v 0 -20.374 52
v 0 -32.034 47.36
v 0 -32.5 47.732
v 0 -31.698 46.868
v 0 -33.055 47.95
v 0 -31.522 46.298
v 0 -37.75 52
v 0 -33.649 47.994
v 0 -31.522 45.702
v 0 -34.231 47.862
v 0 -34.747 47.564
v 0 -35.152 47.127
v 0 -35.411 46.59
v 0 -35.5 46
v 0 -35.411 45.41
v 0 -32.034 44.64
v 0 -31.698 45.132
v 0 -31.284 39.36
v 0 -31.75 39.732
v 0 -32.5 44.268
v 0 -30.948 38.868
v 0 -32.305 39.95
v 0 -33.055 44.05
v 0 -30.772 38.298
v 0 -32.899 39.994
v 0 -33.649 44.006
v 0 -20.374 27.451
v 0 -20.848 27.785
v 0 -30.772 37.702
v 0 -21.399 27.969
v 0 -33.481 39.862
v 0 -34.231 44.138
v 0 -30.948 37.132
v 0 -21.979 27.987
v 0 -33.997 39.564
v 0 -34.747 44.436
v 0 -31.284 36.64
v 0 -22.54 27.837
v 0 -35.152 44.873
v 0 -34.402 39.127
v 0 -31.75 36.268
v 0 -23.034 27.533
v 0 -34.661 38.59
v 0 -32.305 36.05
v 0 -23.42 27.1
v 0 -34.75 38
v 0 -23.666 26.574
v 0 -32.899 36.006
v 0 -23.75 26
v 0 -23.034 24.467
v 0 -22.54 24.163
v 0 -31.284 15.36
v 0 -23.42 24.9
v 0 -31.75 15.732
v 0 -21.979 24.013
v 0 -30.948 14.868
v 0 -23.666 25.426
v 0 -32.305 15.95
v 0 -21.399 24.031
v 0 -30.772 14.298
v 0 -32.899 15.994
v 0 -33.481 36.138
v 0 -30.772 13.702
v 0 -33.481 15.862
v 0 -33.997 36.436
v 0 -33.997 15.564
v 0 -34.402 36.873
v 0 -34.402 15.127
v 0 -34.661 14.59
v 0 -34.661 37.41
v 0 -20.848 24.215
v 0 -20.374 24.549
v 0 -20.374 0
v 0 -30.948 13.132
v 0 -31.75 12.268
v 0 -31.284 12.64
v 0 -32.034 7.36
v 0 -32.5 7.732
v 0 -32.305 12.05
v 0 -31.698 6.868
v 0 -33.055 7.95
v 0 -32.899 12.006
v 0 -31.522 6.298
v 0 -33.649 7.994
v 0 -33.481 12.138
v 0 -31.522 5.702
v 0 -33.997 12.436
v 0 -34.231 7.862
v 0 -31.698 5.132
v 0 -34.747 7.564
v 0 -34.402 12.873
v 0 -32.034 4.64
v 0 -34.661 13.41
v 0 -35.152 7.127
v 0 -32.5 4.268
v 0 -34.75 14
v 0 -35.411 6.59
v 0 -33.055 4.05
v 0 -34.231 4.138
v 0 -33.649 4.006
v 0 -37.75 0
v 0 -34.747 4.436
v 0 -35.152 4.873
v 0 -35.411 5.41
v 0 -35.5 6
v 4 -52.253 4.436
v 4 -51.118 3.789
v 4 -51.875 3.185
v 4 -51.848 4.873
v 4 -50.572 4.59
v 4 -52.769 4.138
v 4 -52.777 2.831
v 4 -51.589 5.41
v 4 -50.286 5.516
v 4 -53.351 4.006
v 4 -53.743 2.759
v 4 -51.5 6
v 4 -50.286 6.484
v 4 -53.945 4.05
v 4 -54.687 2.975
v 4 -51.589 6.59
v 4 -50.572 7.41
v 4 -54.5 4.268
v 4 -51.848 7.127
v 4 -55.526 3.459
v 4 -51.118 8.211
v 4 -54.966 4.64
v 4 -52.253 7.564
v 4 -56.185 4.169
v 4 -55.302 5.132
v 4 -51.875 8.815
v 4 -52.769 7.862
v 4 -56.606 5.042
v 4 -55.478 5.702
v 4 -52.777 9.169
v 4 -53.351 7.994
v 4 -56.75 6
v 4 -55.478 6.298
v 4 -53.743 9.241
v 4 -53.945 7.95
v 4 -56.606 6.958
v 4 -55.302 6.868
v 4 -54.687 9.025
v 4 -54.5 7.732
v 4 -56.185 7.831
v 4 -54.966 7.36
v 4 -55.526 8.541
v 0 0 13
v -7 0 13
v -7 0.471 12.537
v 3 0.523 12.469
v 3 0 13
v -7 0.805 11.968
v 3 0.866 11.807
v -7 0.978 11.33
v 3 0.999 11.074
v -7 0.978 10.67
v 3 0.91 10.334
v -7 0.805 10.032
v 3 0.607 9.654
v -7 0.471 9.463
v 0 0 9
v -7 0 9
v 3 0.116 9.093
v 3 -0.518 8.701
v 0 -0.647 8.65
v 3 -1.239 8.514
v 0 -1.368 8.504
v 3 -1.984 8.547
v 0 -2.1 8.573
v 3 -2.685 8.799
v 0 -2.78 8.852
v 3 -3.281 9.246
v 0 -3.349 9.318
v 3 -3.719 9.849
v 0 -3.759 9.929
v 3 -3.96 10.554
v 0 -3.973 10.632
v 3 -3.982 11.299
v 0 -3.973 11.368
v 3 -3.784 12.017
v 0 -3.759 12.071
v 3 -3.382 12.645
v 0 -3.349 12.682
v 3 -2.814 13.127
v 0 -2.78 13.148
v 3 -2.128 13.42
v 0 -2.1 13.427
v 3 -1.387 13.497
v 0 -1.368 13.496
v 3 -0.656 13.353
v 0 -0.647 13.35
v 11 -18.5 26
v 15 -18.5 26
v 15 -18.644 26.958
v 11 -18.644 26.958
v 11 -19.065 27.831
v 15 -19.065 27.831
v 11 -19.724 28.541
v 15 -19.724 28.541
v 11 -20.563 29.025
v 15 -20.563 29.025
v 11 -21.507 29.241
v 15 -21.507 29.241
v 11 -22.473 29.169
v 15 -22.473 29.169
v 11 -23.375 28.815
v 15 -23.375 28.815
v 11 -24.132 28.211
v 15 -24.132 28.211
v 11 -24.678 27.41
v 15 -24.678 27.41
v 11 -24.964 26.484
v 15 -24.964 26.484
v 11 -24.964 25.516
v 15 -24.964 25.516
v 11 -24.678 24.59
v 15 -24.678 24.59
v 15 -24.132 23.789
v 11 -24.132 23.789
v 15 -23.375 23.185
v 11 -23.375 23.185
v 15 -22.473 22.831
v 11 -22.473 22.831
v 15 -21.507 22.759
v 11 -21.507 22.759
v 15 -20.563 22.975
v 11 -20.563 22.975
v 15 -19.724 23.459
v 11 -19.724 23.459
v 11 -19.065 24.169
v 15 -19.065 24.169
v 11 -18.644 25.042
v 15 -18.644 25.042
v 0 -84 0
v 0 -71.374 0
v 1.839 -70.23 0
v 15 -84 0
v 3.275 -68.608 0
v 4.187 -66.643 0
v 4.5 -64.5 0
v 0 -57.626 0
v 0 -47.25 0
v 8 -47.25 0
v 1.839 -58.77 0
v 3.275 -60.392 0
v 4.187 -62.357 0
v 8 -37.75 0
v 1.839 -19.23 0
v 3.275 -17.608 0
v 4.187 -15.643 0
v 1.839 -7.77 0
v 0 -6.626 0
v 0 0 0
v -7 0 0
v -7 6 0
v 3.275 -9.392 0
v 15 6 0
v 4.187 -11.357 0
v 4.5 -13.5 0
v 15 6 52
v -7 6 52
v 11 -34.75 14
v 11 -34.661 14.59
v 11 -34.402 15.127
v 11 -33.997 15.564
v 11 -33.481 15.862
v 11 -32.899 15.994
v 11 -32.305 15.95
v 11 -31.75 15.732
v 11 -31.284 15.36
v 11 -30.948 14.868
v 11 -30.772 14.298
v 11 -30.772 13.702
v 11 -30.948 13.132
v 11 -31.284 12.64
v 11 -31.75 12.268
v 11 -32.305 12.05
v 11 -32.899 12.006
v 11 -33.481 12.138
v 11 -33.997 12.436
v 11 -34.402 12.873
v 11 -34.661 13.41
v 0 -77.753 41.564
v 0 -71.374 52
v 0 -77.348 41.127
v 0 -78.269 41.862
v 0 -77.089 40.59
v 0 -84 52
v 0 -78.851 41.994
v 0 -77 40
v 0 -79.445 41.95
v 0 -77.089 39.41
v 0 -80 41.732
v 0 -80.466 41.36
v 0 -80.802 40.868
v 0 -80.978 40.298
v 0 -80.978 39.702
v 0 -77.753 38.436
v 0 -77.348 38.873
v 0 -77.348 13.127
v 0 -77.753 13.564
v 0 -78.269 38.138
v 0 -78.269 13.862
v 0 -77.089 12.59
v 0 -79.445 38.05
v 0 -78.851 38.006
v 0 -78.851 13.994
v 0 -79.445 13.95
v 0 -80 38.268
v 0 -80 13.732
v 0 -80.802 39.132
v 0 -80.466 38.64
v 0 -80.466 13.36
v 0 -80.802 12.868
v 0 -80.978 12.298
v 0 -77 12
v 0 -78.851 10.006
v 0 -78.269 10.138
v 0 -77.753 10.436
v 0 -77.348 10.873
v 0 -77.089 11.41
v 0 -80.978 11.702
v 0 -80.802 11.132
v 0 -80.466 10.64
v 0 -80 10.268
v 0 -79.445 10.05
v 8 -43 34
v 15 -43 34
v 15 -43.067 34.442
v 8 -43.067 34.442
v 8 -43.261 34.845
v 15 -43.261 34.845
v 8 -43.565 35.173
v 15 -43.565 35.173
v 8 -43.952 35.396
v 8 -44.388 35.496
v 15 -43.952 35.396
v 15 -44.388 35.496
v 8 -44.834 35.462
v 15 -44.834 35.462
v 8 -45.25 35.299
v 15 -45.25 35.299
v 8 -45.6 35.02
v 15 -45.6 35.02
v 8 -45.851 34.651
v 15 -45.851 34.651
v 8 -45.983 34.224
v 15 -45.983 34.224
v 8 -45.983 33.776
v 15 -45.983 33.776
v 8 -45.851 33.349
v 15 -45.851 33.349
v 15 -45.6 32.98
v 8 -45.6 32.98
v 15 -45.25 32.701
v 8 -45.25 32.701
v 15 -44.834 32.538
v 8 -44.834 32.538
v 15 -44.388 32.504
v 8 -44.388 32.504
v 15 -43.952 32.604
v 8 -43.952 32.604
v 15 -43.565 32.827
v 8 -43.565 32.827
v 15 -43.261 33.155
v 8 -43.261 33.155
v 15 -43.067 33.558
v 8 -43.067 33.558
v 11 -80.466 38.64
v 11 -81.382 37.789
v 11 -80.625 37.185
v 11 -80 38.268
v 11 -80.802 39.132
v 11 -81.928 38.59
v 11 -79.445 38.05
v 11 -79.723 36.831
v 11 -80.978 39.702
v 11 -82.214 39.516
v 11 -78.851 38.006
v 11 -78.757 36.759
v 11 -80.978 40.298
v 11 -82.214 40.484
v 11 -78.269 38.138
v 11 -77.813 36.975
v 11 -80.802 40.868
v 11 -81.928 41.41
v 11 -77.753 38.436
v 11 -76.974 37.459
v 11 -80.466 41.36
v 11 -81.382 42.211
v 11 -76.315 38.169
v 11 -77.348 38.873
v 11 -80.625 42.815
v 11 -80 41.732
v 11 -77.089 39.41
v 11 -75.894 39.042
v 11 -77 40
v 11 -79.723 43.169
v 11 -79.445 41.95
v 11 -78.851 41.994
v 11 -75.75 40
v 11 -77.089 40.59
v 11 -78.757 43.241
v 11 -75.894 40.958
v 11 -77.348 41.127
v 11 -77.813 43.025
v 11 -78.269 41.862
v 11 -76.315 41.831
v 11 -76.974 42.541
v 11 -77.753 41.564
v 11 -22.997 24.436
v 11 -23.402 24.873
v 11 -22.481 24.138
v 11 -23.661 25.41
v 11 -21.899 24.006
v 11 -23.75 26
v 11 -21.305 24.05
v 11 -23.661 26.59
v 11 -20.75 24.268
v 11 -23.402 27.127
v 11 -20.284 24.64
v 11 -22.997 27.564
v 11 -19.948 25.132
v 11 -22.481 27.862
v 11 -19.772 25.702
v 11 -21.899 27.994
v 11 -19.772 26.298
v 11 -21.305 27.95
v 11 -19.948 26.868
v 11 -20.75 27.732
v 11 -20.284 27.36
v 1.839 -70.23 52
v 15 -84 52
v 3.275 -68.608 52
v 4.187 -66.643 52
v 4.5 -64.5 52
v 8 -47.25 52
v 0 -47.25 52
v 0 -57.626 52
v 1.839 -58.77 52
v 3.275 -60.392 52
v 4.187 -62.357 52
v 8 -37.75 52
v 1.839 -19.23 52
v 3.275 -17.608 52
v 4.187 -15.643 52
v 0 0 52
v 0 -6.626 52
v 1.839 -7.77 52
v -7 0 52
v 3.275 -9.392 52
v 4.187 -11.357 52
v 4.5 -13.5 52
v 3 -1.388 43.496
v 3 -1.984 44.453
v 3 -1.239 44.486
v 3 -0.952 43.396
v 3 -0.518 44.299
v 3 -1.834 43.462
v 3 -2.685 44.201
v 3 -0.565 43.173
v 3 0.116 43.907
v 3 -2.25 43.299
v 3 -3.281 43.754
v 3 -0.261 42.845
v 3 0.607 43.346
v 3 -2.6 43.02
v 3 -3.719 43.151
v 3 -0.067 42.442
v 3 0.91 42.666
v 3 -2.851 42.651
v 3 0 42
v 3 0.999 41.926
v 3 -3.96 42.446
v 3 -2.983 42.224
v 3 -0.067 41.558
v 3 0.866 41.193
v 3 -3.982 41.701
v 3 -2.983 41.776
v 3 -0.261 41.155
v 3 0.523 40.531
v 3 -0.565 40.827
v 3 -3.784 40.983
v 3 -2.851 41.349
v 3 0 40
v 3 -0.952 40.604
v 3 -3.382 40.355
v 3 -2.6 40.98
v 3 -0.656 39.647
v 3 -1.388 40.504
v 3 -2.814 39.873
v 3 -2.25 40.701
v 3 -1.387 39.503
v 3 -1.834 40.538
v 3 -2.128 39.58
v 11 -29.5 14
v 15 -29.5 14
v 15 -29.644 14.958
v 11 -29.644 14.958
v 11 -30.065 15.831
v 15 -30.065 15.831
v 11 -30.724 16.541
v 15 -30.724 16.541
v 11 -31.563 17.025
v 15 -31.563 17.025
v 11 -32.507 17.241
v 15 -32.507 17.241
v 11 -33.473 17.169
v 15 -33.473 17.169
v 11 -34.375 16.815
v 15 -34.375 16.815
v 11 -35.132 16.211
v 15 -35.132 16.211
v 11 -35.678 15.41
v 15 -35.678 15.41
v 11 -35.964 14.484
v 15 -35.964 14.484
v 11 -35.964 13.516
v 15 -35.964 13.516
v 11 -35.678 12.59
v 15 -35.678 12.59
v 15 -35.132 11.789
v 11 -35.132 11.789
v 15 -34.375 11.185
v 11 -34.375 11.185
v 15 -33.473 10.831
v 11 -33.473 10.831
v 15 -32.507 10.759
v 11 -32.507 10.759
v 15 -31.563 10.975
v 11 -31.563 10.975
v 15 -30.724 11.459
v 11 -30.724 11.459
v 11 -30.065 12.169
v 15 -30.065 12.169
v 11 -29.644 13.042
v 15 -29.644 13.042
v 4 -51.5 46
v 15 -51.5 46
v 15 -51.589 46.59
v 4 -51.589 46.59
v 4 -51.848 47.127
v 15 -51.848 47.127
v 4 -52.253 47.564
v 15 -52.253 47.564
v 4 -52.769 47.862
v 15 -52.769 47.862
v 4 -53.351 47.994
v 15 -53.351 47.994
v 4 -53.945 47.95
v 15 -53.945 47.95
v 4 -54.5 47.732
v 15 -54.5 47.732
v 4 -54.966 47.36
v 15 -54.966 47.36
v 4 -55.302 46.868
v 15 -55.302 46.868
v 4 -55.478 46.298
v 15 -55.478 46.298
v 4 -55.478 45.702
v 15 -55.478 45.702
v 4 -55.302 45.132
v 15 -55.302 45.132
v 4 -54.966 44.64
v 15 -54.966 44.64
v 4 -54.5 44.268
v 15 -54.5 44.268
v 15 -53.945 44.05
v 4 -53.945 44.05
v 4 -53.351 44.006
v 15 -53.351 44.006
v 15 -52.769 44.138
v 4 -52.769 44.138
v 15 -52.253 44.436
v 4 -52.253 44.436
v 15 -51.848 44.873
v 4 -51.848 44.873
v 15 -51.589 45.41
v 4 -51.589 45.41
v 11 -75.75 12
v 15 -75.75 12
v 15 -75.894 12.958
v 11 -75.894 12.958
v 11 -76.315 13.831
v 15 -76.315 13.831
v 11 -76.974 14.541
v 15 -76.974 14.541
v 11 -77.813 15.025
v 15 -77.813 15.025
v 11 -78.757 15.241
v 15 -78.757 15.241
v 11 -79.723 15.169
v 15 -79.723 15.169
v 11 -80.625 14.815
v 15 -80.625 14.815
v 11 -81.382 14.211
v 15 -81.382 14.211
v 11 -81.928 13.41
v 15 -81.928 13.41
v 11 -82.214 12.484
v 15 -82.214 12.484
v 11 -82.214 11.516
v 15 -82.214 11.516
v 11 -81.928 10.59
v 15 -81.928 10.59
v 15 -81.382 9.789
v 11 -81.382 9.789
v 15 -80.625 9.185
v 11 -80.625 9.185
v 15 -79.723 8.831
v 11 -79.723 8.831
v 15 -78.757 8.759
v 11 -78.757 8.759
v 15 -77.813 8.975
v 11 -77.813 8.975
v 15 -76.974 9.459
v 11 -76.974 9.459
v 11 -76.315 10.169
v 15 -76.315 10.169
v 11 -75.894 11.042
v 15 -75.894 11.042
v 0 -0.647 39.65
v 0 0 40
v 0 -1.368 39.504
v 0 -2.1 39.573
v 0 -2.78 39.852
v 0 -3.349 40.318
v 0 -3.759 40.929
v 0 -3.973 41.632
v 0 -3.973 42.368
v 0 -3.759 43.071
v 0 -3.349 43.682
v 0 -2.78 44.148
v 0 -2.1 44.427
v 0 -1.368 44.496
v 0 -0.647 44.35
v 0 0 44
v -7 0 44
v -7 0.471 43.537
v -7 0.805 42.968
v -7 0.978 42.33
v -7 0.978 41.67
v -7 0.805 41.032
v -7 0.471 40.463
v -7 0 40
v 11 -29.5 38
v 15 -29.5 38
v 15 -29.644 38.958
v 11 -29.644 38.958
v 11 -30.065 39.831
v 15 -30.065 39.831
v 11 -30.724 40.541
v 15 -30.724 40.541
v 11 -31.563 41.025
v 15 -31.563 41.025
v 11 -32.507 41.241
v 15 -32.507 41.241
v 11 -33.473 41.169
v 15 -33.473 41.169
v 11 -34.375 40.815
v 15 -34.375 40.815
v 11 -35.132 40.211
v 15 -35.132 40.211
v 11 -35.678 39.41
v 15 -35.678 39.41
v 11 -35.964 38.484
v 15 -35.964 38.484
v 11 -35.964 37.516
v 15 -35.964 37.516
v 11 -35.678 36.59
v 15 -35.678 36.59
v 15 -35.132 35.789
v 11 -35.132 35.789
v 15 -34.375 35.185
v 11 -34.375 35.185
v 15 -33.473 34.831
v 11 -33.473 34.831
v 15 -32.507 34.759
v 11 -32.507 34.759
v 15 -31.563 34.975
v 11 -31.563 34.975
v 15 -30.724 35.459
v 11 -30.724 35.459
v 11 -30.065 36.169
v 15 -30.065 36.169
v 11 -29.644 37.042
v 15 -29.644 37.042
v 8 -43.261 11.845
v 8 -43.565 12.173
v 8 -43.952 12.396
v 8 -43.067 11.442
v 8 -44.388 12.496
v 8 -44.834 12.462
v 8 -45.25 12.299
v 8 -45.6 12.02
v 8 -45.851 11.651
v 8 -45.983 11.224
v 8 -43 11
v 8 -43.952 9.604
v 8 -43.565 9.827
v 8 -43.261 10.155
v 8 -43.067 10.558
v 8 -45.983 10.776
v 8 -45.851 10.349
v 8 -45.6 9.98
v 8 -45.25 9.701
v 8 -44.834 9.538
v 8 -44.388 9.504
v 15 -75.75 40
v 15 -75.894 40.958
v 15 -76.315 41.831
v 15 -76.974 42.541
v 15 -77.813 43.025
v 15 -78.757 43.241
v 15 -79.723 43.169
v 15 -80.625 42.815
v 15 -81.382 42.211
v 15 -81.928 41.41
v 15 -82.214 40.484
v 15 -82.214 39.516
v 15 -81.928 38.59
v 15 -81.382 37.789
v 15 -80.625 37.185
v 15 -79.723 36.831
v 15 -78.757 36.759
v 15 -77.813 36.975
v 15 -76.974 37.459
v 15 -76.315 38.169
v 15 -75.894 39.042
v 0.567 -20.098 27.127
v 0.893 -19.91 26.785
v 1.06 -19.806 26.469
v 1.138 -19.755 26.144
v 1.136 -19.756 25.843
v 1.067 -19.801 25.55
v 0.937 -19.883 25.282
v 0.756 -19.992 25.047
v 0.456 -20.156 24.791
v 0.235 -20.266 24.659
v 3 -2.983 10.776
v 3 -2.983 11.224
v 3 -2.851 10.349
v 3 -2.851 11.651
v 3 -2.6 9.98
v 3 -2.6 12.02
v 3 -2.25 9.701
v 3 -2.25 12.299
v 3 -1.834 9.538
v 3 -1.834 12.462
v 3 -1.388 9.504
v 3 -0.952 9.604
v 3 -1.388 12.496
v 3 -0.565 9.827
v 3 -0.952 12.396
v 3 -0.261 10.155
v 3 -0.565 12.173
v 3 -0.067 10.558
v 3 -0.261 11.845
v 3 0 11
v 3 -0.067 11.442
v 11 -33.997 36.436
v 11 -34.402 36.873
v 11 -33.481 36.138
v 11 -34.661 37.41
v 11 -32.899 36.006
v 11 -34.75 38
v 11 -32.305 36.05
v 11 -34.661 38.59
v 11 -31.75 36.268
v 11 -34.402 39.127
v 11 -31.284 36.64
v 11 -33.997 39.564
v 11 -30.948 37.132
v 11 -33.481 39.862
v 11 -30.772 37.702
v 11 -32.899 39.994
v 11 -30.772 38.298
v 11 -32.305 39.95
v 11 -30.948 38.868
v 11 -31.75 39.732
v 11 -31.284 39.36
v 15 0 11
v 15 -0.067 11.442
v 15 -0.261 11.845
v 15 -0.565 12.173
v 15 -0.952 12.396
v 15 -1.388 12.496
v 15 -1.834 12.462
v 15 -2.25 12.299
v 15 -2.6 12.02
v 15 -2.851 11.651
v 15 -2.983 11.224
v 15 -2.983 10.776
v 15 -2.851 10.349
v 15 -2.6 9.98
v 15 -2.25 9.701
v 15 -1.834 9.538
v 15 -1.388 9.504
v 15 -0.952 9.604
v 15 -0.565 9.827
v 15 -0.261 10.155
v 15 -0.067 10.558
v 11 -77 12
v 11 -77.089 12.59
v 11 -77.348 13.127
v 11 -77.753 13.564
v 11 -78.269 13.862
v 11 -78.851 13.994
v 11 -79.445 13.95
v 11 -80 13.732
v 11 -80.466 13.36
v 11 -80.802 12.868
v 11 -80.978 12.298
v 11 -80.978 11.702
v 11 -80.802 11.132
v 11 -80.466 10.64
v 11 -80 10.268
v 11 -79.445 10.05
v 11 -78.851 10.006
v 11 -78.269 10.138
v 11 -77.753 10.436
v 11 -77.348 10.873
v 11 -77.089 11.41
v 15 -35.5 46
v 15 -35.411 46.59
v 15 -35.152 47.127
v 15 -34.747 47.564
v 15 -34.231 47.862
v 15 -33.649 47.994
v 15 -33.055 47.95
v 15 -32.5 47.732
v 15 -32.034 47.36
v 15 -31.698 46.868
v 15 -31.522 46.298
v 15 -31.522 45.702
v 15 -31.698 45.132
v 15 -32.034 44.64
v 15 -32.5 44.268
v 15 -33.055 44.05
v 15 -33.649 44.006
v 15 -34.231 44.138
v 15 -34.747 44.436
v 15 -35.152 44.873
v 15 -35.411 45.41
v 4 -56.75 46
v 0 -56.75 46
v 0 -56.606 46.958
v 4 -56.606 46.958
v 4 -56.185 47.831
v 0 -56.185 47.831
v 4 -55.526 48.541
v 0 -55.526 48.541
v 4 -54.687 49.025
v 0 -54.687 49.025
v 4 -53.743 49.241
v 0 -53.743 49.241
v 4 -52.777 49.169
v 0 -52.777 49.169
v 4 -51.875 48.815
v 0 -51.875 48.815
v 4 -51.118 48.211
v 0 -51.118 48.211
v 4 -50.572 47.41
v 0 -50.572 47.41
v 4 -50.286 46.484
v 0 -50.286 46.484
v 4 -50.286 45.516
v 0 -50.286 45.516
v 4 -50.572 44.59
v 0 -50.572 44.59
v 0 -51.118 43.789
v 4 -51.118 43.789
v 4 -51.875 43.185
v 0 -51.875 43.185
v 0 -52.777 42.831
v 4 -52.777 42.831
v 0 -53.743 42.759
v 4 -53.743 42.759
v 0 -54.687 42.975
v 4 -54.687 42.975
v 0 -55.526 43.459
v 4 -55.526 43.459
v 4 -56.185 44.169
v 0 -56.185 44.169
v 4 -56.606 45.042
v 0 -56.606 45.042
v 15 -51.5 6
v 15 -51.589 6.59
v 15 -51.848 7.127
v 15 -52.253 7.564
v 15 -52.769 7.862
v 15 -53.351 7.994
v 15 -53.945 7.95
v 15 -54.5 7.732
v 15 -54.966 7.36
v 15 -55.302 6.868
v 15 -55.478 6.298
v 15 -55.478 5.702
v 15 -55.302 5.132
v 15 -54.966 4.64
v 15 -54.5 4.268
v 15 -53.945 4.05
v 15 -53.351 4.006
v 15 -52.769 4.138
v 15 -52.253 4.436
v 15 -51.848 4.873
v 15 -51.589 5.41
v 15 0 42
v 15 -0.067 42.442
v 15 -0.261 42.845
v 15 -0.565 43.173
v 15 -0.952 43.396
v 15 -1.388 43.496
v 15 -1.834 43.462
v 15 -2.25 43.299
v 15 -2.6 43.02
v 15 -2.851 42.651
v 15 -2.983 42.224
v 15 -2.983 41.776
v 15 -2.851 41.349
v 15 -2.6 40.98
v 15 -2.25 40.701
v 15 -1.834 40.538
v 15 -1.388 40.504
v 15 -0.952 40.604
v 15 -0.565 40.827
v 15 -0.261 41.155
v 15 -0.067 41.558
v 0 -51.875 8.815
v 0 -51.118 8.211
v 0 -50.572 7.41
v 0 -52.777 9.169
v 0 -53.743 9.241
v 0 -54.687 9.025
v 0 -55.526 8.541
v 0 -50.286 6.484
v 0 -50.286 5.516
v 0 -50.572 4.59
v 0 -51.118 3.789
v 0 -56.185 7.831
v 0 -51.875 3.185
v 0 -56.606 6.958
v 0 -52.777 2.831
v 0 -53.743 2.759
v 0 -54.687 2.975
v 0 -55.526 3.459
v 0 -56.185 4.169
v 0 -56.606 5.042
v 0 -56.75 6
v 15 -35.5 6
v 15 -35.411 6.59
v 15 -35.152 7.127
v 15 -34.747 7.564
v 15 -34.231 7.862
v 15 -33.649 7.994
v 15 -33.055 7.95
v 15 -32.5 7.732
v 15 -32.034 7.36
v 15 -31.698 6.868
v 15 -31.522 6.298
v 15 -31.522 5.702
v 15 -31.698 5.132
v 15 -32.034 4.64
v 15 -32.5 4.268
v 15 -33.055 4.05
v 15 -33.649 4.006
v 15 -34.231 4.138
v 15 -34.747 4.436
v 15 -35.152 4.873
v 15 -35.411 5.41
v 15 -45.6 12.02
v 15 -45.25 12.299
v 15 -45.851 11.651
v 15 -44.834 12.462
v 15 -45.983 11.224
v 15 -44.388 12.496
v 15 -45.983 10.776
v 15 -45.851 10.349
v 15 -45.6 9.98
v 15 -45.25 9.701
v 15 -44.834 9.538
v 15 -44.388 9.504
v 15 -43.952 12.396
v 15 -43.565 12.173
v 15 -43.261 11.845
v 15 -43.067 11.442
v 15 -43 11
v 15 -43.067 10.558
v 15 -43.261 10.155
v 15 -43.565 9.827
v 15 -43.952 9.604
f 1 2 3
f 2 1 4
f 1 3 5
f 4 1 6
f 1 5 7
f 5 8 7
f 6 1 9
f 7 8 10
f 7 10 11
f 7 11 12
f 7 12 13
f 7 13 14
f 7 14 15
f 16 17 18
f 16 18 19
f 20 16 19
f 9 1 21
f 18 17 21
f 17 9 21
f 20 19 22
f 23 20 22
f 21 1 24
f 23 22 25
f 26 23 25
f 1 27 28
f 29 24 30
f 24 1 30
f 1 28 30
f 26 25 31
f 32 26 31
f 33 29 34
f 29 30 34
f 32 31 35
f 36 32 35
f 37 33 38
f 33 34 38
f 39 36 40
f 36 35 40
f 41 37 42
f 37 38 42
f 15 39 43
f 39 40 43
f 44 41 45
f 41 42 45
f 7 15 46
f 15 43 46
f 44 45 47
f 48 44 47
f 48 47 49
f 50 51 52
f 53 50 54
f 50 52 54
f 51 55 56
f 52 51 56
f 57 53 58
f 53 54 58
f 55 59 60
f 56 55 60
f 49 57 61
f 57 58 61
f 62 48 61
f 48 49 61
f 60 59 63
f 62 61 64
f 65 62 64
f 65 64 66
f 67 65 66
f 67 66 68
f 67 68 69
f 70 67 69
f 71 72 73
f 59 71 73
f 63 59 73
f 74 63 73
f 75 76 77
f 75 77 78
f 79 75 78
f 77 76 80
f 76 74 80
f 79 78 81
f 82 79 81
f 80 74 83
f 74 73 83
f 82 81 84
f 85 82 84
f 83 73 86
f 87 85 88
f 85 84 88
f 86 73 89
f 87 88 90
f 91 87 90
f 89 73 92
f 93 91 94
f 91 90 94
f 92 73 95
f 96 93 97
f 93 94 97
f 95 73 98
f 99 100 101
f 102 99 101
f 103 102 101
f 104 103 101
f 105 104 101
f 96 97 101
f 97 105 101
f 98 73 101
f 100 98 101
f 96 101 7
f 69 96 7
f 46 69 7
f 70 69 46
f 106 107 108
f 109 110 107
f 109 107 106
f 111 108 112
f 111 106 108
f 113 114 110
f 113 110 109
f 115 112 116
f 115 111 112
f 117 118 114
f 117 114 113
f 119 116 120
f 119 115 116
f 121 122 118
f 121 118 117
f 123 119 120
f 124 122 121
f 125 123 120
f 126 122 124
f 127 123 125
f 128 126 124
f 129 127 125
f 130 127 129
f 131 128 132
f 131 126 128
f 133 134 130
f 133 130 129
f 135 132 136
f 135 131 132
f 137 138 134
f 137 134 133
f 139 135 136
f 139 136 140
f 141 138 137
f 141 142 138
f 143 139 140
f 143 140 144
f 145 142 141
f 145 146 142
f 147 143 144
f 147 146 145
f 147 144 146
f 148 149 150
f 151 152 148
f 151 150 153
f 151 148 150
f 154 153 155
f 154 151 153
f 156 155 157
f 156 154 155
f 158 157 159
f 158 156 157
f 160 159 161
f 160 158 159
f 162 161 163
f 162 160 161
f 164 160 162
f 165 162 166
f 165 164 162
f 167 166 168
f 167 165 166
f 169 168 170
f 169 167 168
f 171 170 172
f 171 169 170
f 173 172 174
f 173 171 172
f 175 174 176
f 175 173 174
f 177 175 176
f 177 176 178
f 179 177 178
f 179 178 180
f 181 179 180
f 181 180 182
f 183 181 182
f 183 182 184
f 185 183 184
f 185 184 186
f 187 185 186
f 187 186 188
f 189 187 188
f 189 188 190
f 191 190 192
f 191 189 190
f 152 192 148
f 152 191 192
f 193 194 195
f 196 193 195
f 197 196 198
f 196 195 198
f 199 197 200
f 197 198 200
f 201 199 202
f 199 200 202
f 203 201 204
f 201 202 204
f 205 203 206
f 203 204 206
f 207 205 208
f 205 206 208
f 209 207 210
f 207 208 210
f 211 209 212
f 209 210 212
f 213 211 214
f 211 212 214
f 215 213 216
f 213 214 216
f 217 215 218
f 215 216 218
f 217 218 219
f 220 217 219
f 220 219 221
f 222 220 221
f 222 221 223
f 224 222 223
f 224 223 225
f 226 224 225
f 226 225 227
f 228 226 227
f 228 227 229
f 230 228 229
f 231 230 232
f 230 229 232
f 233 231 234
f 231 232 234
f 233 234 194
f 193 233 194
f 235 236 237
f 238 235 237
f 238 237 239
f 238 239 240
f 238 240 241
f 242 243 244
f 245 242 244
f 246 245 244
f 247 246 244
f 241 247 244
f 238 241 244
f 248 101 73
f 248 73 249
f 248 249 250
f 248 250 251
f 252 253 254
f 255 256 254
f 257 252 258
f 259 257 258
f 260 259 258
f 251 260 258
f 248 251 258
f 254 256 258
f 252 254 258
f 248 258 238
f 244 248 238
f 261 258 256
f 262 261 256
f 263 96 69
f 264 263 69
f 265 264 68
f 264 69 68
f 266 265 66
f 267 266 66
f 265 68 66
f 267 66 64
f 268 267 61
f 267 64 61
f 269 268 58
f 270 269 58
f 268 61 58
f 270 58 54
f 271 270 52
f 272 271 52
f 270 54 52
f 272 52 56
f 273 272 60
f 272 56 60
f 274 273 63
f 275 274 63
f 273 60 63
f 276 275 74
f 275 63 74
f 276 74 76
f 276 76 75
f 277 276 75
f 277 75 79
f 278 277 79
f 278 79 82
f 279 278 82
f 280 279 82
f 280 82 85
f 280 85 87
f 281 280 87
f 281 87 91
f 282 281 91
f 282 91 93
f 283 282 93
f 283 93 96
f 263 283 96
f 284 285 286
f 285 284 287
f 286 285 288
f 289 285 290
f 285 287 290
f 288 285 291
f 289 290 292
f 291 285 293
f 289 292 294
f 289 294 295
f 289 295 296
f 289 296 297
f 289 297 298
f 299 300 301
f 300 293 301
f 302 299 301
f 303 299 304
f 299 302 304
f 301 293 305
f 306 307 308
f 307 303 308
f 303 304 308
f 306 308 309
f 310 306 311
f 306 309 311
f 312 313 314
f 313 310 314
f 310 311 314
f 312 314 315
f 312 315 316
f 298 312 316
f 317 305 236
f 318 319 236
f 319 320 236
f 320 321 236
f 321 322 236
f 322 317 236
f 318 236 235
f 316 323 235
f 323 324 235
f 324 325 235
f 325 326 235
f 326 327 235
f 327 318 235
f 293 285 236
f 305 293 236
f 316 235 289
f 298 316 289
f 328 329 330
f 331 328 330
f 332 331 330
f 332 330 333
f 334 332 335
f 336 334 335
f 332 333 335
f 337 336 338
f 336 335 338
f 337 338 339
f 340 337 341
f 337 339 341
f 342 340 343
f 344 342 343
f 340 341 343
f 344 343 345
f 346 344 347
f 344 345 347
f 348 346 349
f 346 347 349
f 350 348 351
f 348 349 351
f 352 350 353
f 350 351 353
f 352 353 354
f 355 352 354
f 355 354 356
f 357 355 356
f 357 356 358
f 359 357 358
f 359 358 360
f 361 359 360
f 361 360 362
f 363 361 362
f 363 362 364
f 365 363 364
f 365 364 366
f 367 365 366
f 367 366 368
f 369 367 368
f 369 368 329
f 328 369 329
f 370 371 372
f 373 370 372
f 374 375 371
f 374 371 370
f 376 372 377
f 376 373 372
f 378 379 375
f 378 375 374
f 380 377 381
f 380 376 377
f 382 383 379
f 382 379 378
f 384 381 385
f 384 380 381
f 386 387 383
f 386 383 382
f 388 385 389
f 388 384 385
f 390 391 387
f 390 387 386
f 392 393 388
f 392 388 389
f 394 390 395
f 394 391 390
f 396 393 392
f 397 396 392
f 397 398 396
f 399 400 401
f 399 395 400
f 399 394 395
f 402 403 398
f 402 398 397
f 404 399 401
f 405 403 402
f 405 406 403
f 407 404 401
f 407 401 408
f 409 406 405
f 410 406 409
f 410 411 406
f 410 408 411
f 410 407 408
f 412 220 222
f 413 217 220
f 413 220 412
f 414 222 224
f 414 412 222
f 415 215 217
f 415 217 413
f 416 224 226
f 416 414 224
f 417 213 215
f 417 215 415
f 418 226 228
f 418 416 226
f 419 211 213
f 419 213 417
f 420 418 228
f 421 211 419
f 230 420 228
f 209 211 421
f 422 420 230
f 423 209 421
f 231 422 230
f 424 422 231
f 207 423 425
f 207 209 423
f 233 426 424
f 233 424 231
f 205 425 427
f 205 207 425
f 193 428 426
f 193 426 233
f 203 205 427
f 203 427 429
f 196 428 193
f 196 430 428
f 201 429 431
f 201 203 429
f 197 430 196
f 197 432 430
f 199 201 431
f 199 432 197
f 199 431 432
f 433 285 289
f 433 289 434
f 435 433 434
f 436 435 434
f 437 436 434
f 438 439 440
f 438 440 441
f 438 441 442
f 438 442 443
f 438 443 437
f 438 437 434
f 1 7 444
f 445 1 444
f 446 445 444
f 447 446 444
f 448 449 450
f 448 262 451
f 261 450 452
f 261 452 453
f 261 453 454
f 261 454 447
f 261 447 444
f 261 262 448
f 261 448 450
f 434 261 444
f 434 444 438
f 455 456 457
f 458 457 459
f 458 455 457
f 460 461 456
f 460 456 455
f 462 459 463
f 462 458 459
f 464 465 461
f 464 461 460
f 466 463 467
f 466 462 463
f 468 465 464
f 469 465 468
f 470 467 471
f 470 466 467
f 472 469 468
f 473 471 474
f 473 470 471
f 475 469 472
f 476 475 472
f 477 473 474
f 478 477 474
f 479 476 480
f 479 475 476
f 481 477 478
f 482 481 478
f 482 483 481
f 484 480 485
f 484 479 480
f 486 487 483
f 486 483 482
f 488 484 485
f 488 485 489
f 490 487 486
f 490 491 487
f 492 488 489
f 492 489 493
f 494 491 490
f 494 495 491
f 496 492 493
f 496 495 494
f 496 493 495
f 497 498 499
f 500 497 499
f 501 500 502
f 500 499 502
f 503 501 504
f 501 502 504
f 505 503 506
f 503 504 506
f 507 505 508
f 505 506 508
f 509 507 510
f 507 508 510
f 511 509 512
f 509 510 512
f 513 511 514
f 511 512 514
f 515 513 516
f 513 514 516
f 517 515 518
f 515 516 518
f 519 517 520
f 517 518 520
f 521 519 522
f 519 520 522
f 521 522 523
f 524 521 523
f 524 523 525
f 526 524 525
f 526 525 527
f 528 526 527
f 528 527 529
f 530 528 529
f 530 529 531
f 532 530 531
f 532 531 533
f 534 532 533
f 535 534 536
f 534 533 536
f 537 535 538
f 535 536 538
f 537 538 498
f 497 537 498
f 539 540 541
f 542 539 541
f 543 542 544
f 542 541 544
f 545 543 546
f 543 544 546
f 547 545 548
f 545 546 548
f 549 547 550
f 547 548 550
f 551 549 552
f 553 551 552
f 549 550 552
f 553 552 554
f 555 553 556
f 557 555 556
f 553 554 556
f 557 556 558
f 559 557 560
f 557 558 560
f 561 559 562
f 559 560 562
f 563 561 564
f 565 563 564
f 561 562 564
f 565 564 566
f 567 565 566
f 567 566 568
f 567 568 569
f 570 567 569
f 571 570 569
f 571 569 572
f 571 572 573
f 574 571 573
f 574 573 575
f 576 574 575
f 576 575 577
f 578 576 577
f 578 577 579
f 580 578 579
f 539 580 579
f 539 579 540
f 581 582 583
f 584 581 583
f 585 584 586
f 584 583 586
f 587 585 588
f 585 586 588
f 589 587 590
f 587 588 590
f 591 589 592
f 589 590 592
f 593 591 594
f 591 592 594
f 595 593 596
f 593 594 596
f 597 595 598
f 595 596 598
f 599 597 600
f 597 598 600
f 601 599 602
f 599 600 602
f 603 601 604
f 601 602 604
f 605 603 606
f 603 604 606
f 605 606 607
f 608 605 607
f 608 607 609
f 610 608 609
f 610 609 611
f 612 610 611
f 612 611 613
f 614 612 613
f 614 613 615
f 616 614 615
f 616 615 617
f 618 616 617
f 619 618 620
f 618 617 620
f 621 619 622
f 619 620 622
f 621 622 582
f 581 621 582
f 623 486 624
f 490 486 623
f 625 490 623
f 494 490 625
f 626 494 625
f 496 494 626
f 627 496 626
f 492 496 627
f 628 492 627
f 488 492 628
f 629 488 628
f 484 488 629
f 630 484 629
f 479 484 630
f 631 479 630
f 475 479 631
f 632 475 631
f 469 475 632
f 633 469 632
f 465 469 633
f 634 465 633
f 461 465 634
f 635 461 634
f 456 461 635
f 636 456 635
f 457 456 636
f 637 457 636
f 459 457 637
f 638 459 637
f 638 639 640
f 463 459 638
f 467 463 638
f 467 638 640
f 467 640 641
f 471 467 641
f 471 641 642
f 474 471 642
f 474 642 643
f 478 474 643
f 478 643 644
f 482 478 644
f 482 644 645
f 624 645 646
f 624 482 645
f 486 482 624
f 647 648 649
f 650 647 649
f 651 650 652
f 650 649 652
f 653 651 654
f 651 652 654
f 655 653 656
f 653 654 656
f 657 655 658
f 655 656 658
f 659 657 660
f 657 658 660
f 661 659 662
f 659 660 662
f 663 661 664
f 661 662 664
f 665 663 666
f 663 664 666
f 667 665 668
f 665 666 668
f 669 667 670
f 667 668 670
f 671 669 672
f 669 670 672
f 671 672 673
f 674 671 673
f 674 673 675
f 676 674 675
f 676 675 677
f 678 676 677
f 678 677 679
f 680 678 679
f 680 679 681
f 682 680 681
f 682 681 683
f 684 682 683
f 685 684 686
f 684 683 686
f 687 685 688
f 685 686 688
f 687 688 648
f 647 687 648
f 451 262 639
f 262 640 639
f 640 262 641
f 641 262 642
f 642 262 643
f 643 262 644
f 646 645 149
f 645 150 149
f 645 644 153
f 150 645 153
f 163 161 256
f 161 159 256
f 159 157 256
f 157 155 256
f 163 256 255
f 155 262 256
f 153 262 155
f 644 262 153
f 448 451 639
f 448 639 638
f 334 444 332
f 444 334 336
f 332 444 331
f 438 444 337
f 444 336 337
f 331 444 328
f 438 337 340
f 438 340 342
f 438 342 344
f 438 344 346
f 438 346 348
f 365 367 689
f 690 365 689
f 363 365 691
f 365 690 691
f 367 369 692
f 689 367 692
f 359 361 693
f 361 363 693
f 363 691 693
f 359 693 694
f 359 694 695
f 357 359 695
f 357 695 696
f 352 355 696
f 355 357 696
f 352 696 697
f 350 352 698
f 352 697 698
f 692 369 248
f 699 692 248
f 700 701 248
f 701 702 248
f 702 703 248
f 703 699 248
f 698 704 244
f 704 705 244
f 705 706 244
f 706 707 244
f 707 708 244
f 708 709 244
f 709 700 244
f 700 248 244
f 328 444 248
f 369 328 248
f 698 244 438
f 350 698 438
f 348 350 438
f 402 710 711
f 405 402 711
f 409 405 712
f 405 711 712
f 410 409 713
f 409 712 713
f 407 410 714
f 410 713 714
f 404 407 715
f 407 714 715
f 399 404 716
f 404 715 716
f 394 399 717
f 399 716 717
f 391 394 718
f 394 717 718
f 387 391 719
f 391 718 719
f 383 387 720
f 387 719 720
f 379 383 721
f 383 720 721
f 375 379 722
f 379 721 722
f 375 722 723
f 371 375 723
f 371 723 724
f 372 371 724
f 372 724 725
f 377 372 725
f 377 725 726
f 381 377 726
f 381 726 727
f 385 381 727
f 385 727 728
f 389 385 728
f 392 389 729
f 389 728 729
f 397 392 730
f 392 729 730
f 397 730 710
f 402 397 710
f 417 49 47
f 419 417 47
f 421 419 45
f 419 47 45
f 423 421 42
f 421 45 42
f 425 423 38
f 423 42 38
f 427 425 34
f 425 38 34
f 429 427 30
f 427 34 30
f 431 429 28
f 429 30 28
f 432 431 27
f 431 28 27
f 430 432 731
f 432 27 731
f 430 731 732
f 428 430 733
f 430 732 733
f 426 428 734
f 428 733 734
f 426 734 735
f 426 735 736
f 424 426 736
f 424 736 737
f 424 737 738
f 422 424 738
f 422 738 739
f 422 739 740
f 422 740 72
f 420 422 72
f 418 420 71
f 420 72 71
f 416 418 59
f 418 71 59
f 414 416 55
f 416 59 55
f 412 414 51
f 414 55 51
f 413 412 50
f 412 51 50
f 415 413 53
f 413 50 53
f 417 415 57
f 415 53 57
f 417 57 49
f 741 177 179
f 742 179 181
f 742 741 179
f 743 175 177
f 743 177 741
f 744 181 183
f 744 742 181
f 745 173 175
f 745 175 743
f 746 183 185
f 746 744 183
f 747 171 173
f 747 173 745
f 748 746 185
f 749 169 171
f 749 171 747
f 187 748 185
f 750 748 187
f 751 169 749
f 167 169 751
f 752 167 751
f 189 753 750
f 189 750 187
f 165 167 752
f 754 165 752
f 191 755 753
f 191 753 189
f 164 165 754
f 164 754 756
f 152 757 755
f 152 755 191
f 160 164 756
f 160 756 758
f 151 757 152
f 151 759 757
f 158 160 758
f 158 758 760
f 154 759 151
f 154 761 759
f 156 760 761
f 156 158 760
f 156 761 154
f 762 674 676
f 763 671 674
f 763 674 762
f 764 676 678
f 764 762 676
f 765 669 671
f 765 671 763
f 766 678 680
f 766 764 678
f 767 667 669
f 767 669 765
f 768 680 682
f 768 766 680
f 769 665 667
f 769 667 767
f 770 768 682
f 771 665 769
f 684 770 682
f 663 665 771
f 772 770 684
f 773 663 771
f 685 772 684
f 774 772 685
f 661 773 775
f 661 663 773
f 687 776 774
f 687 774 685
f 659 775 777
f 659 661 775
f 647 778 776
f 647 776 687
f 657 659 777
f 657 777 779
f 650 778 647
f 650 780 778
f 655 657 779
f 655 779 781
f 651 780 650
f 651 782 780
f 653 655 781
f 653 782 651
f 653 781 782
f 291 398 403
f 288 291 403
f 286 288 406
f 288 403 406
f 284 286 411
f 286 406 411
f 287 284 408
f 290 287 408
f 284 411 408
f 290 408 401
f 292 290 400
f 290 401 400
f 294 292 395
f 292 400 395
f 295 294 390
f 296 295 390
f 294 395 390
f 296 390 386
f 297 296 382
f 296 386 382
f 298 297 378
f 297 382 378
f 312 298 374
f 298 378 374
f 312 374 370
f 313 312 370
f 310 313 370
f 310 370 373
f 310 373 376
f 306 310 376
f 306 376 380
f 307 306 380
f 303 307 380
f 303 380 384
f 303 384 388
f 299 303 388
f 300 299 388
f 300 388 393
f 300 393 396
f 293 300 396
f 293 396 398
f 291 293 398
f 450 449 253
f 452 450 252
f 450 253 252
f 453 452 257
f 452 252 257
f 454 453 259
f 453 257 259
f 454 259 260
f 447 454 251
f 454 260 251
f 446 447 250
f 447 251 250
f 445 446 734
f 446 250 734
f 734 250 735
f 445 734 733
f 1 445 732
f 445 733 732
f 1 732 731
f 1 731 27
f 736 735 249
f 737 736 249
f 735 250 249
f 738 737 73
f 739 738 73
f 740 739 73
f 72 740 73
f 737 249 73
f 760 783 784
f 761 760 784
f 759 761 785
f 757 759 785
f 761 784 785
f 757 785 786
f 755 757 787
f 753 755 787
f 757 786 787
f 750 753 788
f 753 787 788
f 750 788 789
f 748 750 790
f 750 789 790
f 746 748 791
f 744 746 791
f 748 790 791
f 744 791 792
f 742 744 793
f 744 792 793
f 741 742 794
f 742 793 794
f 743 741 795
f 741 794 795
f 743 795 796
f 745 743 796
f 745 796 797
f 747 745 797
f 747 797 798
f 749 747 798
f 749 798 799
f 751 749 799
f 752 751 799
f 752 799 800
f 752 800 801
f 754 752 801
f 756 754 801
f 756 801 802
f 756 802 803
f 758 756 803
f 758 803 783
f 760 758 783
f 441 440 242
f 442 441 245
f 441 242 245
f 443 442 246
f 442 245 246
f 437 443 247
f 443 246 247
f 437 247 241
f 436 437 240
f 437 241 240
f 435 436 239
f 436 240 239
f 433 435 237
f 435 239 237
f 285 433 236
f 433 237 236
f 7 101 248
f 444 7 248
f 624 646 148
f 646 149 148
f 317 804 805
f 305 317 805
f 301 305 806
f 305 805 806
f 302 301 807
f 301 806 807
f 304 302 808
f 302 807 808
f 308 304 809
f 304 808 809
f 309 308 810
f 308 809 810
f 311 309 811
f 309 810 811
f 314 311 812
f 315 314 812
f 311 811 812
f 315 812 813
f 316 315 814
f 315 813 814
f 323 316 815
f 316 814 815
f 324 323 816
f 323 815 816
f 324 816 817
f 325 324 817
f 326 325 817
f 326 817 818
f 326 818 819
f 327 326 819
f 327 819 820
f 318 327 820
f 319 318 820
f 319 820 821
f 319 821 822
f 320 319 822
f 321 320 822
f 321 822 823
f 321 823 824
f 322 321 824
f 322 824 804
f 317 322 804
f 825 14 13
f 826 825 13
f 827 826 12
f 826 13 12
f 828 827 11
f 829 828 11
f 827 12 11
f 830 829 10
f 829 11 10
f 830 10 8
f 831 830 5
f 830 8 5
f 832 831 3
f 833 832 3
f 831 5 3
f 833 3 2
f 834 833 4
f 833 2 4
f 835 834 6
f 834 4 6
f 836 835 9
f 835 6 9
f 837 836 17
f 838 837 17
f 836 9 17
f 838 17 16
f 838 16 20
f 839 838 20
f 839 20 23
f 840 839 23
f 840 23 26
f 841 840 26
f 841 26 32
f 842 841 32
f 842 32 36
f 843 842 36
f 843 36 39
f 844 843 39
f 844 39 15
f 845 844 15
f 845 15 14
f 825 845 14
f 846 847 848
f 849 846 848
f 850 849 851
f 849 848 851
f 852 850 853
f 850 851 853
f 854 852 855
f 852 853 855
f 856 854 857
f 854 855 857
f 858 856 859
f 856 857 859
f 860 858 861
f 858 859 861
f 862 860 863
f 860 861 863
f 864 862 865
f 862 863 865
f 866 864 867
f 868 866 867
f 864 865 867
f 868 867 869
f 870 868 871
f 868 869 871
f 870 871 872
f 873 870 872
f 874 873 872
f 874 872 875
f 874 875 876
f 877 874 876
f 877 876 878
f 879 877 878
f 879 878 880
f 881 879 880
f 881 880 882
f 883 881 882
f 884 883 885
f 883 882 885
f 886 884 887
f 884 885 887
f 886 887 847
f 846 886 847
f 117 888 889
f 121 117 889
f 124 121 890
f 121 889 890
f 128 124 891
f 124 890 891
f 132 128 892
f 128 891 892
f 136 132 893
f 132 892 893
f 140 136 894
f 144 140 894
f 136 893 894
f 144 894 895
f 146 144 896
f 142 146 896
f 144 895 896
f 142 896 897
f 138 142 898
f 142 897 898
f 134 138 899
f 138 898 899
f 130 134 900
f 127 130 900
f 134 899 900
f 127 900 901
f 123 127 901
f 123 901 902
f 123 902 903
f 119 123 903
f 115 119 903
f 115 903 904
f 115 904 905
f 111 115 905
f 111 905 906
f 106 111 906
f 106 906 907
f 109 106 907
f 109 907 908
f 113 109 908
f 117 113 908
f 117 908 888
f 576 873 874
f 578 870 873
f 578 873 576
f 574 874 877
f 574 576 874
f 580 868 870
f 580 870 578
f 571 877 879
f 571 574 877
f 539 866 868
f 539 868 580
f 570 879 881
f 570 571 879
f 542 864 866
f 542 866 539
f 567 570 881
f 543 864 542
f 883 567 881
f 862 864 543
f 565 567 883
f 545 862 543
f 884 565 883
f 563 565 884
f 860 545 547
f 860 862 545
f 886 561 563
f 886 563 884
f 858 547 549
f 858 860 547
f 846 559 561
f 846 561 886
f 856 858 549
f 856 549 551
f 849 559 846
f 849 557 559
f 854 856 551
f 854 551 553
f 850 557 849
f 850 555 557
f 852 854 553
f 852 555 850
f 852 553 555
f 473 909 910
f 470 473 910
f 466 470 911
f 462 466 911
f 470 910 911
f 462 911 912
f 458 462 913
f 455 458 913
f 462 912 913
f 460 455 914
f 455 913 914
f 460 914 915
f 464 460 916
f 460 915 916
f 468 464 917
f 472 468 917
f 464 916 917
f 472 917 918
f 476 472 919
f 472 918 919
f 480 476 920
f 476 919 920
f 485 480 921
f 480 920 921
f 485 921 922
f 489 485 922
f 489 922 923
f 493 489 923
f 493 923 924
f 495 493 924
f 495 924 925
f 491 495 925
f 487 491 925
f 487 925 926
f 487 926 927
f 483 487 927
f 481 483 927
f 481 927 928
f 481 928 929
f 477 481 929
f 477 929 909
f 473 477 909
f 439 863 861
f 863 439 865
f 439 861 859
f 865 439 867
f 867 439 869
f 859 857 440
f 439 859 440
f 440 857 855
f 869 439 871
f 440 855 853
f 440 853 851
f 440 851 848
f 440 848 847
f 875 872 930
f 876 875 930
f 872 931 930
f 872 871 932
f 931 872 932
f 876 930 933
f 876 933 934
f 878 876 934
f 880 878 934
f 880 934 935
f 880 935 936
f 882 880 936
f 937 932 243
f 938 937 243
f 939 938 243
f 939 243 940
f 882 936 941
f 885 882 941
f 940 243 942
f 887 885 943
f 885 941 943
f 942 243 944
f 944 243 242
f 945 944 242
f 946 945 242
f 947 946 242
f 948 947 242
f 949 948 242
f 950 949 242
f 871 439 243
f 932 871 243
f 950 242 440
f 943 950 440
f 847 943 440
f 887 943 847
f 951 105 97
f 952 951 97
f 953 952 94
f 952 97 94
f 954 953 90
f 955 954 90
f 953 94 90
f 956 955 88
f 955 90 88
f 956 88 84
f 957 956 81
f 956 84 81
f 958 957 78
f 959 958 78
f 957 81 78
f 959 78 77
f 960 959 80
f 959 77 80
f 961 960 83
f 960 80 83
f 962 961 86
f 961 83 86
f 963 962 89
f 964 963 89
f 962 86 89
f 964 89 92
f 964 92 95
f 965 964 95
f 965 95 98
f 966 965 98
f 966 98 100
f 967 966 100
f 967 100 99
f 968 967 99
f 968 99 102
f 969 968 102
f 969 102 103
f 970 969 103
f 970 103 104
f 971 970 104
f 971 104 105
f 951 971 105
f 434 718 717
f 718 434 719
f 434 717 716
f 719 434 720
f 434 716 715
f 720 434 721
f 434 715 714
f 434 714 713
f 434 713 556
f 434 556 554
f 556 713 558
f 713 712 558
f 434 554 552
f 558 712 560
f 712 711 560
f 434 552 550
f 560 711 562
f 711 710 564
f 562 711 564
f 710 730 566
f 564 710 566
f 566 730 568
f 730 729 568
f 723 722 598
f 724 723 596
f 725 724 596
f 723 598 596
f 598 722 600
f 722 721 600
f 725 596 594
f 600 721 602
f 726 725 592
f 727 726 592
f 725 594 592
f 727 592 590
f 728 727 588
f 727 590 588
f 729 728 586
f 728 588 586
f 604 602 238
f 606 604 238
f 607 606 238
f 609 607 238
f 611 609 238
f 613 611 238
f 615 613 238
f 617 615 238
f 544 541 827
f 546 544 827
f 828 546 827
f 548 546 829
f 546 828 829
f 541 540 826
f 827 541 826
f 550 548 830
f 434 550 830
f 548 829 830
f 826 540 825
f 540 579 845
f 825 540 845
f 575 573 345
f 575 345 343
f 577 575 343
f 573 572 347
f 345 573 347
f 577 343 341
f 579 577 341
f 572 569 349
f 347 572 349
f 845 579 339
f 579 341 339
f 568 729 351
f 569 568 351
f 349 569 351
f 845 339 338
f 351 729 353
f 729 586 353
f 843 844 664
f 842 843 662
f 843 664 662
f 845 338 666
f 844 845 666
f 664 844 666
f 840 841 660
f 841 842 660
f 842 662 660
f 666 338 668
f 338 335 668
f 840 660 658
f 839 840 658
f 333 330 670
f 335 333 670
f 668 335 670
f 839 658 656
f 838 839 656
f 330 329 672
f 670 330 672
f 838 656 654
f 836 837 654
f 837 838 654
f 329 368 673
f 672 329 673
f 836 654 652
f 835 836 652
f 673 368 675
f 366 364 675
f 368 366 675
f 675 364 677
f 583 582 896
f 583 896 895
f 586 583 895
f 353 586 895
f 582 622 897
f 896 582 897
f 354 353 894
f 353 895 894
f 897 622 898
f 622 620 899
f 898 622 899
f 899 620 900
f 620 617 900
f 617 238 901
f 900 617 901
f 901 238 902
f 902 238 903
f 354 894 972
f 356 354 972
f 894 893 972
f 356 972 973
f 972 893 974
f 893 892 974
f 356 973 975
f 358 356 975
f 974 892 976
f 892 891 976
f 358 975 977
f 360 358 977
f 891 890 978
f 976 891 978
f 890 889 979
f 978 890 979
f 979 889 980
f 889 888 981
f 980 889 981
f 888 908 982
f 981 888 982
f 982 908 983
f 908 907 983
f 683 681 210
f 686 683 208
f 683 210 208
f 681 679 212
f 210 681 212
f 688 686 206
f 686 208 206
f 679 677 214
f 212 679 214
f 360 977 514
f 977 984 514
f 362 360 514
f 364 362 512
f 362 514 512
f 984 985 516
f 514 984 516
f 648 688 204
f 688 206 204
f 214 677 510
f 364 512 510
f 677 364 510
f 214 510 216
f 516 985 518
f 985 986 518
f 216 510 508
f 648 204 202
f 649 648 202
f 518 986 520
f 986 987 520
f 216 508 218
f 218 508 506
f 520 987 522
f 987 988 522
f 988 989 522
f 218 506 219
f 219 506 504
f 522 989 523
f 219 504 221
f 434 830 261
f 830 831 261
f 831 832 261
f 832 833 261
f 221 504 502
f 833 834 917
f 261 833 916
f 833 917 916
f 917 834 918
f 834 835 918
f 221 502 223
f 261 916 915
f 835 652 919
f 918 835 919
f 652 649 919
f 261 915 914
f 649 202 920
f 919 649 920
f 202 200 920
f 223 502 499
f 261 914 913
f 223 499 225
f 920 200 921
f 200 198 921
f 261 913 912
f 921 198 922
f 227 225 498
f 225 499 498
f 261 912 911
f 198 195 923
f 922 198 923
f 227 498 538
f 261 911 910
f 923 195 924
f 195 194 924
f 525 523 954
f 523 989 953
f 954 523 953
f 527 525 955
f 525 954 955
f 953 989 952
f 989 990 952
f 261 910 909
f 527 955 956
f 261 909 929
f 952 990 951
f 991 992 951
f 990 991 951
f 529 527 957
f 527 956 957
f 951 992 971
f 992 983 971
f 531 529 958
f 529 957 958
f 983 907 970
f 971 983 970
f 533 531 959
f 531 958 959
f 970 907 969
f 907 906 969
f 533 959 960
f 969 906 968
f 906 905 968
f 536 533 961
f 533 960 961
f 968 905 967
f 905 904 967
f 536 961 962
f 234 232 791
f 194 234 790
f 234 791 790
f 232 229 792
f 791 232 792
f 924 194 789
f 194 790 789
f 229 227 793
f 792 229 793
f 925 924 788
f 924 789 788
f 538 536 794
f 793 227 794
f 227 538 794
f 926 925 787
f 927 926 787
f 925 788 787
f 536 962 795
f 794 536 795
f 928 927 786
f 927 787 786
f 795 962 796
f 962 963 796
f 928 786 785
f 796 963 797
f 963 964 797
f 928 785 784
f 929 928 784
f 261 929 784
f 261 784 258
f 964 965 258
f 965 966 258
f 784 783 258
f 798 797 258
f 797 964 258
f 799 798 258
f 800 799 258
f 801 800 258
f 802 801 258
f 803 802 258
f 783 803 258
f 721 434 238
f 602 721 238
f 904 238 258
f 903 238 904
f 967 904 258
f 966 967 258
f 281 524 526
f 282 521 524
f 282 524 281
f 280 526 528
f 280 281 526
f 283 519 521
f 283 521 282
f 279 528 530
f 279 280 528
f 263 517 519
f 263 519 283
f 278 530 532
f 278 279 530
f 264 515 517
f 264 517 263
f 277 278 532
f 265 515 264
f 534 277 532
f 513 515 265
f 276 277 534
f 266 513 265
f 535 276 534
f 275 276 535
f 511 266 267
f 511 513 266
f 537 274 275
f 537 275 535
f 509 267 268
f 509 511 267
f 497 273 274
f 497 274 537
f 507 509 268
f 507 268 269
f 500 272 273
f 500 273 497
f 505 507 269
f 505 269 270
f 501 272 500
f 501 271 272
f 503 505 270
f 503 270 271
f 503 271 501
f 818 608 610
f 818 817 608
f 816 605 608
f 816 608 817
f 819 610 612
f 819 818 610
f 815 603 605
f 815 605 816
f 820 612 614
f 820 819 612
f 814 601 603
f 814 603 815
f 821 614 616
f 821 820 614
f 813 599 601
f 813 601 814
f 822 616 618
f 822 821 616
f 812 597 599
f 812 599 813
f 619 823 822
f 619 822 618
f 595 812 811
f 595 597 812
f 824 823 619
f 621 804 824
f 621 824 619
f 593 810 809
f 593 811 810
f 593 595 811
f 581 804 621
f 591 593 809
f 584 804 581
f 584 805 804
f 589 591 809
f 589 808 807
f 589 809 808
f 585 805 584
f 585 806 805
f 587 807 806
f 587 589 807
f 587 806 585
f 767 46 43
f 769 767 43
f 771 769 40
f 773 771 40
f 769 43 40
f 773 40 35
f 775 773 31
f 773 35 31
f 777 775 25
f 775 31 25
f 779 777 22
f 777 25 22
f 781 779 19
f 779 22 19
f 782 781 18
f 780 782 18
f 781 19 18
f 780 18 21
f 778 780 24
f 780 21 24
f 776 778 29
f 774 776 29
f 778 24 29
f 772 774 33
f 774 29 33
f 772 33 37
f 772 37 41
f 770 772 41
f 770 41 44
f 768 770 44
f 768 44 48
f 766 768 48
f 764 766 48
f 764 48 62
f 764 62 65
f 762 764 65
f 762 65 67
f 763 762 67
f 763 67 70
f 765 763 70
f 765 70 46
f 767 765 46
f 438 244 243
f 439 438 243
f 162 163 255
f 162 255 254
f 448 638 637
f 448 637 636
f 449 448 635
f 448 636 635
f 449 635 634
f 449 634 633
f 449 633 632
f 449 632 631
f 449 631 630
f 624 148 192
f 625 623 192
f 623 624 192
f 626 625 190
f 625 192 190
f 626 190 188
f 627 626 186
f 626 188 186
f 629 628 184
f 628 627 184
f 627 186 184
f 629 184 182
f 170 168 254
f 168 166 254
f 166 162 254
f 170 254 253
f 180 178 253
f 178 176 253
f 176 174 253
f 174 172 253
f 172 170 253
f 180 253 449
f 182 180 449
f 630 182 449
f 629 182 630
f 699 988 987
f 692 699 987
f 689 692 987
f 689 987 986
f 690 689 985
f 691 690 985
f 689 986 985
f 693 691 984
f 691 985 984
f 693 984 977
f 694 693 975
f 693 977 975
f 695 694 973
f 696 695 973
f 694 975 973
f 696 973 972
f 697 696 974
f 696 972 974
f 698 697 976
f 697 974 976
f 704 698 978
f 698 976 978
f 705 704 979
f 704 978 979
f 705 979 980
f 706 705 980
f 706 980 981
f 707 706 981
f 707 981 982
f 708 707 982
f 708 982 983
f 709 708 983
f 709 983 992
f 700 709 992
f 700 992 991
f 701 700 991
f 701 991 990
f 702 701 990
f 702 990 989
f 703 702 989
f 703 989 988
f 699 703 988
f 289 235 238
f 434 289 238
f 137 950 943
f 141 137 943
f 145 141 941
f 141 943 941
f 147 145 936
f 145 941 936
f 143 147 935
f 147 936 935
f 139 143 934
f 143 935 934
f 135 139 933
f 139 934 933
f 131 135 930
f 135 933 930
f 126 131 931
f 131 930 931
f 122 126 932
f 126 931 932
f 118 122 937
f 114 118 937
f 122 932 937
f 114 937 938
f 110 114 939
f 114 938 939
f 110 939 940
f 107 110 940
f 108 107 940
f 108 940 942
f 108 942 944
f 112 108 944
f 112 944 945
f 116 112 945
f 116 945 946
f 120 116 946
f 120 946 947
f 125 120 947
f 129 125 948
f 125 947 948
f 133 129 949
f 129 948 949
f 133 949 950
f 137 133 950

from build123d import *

# Parameters (mm, degrees)
BOSS_EXTRUDE1_DEPTH          = 52
SKETCH2_R                    = 2
CUT_EXTRUDE1_DEPTH           = 100.924971854
ESQUISSE1_R                  = 1.5
ENL_V_MAT_EXTRU_1_DEPTH      = 102.212647431
ENL_V_MAT_EXTRU_2_DEPTH      = 100.924971854
ENL_V_MAT_EXTRU_2_DEPTH_BACK = 3
ESQUISSE2_R                  = 2.5
ESQUISSE3_R                  = 3.25
ENL_V_MAT_EXTRU_3_DEPTH      = 4
ESQUISSE4_R                  = 2
ENL_V_MAT_EXTRU_4_DEPTH      = 102.212647431
ESQUISSE4_3_R                = 3.25
ESQUISSE4_3_R_2              = 2
ENL_V_MAT_EXTRU_5_DEPTH      = 4
ESQUISSE5_R                  = 2
ENL_V_MAT_EXTRU_6_DEPTH      = 100.924971854
ESQUISSE6_R                  = 2
ENL_V_MAT_EXTRU_7_DEPTH      = 102.212647431
ESQUISSE7_R                  = 3.25
ENL_V_MAT_EXTRU_8_DEPTH      = 4
ESQUISSE8_R                  = 7.5
ENL_V_MAT_EXTRU_9_DEPTH      = 100.924971854


with BuildPart() as part:
    # Sketch1 → Boss-Extrude1 (new body)
    with BuildSketch(Plane.XY):
        Polygon((0, 0), (0, -37.75), (8, -37.75), (8, -47.25), (0, -47.25), (0, -84), (15, -84), (15, 6), (-7, 6), (-7, 0), align=None)
    extrude(amount=BOSS_EXTRUDE1_DEPTH)

    # Sketch2 → Cut-Extrude1 (cut, through all)
    with BuildSketch(Plane.ZY):
        with Locations((26, -21.75)):
            Circle(SKETCH2_R)
        with Locations((38, -32.75)):
            Circle(SKETCH2_R)
        with Locations((14, -32.75)):
            Circle(SKETCH2_R)
    extrude(amount=-CUT_EXTRUDE1_DEPTH, mode=Mode.SUBTRACT)

    # Esquisse1 → Enlèv. mat.-Extru.1 (cut, through all)
    with BuildSketch(Plane(origin=(15, 0, 0), x_dir=(0, 0, -1), z_dir=(1, 0, 0))):
        with Locations((-42, -1.5)):
            Circle(ESQUISSE1_R)
        with Locations((-11, -1.5)):
            Circle(ESQUISSE1_R)
        with Locations((-34, -44.5)):
            Circle(ESQUISSE1_R)
        with Locations((-11, -44.5)):
            Circle(ESQUISSE1_R)
    extrude(amount=-ENL_V_MAT_EXTRU_1_DEPTH, mode=Mode.SUBTRACT)

    # Esquisse2 → Enlèv. mat.-Extru.2 (cut, two sides: drawn at the far end of the back side and taken through both)
    with BuildSketch(Plane.ZY.offset(-ENL_V_MAT_EXTRU_2_DEPTH_BACK)):
        with Locations((42, -1.5)):
            Circle(ESQUISSE2_R)
        with Locations((11, -1.5)):
            Circle(ESQUISSE2_R)
    extrude(amount=ENL_V_MAT_EXTRU_2_DEPTH + ENL_V_MAT_EXTRU_2_DEPTH_BACK, mode=Mode.SUBTRACT)

    # Esquisse3 → Enlèv. mat.-Extru.3 (cut)
    with BuildSketch(Plane(origin=(15, 0, 0), x_dir=(0, 0, -1), z_dir=(1, 0, 0))):
        with Locations((-26, -21.75)):
            Circle(ESQUISSE3_R)
        with Locations((-14, -32.75)):
            Circle(ESQUISSE3_R)
        with Locations((-38, -32.75)):
            Circle(ESQUISSE3_R)
    extrude(amount=-ENL_V_MAT_EXTRU_3_DEPTH, mode=Mode.SUBTRACT)

    # Esquisse4 → Enlèv. mat.-Extru.4 (cut, through all)
    with BuildSketch(Plane(origin=(15, 0, 0), x_dir=(0, 0, -1), z_dir=(1, 0, 0))):
        with Locations((-40, -79)):
            Circle(ESQUISSE4_R)
        with Locations((-12, -79)):
            Circle(ESQUISSE4_R)
    extrude(amount=-ENL_V_MAT_EXTRU_4_DEPTH, mode=Mode.SUBTRACT)

    # Esquisse4<3> → Enlèv. mat.-Extru.5 (cut)
    # profile 1 of 2: a face of its own
    with BuildSketch(Plane(origin=(15, 0, 0), x_dir=(0, 0, -1), z_dir=(1, 0, 0))):
        with Locations((-12, -79)):
            Circle(ESQUISSE4_3_R)
        with Locations((-12, -79)):
            Circle(ESQUISSE4_3_R_2, mode=Mode.SUBTRACT)
    # profile 2 of 2: a face of its own
    with BuildSketch(Plane(origin=(15, 0, 0), x_dir=(0, 0, -1), z_dir=(1, 0, 0))):
        with Locations((-40, -79)):
            Circle(ESQUISSE4_3_R)
        with Locations((-40, -79)):
            Circle(ESQUISSE4_3_R_2, mode=Mode.SUBTRACT)
    extrude(amount=-ENL_V_MAT_EXTRU_5_DEPTH, mode=Mode.SUBTRACT)

    # Esquisse5 → Enlèv. mat.-Extru.6 (cut, through all)
    with BuildSketch(Plane.ZY):
        with Locations((46, -33.5)):
            Circle(ESQUISSE5_R)
        with Locations((6, -33.5)):
            Circle(ESQUISSE5_R)
    extrude(amount=-ENL_V_MAT_EXTRU_6_DEPTH, mode=Mode.SUBTRACT)

    # Esquisse6 → Enlèv. mat.-Extru.7 (cut, through all)
    with BuildSketch(Plane(origin=(15, 0, 0), x_dir=(0, 0, -1), z_dir=(1, 0, 0))):
        with Locations((-6, -53.5)):
            Circle(ESQUISSE6_R)
        with Locations((-46, -53.5)):
            Circle(ESQUISSE6_R)
    extrude(amount=-ENL_V_MAT_EXTRU_7_DEPTH, mode=Mode.SUBTRACT)

    # Esquisse7 → Enlèv. mat.-Extru.8 (cut)
    with BuildSketch(Plane.ZY):
        with Locations((46, -53.5)):
            Circle(ESQUISSE7_R)
        with Locations((6, -53.5)):
            Circle(ESQUISSE7_R)
    extrude(amount=-ENL_V_MAT_EXTRU_8_DEPTH, mode=Mode.SUBTRACT)

    # Esquisse8 → Enlèv. mat.-Extru.9 (cut, through all)
    with BuildSketch(Plane(origin=(0, 0, 0), x_dir=(-1, 0, 0), z_dir=(0, 0, -1))):
        with Locations((3, -13.5)):
            Circle(ESQUISSE8_R)
        with Locations((3, -64.5)):
            Circle(ESQUISSE8_R)
    extrude(amount=-ENL_V_MAT_EXTRU_9_DEPTH, mode=Mode.SUBTRACT)


solid = part.part
